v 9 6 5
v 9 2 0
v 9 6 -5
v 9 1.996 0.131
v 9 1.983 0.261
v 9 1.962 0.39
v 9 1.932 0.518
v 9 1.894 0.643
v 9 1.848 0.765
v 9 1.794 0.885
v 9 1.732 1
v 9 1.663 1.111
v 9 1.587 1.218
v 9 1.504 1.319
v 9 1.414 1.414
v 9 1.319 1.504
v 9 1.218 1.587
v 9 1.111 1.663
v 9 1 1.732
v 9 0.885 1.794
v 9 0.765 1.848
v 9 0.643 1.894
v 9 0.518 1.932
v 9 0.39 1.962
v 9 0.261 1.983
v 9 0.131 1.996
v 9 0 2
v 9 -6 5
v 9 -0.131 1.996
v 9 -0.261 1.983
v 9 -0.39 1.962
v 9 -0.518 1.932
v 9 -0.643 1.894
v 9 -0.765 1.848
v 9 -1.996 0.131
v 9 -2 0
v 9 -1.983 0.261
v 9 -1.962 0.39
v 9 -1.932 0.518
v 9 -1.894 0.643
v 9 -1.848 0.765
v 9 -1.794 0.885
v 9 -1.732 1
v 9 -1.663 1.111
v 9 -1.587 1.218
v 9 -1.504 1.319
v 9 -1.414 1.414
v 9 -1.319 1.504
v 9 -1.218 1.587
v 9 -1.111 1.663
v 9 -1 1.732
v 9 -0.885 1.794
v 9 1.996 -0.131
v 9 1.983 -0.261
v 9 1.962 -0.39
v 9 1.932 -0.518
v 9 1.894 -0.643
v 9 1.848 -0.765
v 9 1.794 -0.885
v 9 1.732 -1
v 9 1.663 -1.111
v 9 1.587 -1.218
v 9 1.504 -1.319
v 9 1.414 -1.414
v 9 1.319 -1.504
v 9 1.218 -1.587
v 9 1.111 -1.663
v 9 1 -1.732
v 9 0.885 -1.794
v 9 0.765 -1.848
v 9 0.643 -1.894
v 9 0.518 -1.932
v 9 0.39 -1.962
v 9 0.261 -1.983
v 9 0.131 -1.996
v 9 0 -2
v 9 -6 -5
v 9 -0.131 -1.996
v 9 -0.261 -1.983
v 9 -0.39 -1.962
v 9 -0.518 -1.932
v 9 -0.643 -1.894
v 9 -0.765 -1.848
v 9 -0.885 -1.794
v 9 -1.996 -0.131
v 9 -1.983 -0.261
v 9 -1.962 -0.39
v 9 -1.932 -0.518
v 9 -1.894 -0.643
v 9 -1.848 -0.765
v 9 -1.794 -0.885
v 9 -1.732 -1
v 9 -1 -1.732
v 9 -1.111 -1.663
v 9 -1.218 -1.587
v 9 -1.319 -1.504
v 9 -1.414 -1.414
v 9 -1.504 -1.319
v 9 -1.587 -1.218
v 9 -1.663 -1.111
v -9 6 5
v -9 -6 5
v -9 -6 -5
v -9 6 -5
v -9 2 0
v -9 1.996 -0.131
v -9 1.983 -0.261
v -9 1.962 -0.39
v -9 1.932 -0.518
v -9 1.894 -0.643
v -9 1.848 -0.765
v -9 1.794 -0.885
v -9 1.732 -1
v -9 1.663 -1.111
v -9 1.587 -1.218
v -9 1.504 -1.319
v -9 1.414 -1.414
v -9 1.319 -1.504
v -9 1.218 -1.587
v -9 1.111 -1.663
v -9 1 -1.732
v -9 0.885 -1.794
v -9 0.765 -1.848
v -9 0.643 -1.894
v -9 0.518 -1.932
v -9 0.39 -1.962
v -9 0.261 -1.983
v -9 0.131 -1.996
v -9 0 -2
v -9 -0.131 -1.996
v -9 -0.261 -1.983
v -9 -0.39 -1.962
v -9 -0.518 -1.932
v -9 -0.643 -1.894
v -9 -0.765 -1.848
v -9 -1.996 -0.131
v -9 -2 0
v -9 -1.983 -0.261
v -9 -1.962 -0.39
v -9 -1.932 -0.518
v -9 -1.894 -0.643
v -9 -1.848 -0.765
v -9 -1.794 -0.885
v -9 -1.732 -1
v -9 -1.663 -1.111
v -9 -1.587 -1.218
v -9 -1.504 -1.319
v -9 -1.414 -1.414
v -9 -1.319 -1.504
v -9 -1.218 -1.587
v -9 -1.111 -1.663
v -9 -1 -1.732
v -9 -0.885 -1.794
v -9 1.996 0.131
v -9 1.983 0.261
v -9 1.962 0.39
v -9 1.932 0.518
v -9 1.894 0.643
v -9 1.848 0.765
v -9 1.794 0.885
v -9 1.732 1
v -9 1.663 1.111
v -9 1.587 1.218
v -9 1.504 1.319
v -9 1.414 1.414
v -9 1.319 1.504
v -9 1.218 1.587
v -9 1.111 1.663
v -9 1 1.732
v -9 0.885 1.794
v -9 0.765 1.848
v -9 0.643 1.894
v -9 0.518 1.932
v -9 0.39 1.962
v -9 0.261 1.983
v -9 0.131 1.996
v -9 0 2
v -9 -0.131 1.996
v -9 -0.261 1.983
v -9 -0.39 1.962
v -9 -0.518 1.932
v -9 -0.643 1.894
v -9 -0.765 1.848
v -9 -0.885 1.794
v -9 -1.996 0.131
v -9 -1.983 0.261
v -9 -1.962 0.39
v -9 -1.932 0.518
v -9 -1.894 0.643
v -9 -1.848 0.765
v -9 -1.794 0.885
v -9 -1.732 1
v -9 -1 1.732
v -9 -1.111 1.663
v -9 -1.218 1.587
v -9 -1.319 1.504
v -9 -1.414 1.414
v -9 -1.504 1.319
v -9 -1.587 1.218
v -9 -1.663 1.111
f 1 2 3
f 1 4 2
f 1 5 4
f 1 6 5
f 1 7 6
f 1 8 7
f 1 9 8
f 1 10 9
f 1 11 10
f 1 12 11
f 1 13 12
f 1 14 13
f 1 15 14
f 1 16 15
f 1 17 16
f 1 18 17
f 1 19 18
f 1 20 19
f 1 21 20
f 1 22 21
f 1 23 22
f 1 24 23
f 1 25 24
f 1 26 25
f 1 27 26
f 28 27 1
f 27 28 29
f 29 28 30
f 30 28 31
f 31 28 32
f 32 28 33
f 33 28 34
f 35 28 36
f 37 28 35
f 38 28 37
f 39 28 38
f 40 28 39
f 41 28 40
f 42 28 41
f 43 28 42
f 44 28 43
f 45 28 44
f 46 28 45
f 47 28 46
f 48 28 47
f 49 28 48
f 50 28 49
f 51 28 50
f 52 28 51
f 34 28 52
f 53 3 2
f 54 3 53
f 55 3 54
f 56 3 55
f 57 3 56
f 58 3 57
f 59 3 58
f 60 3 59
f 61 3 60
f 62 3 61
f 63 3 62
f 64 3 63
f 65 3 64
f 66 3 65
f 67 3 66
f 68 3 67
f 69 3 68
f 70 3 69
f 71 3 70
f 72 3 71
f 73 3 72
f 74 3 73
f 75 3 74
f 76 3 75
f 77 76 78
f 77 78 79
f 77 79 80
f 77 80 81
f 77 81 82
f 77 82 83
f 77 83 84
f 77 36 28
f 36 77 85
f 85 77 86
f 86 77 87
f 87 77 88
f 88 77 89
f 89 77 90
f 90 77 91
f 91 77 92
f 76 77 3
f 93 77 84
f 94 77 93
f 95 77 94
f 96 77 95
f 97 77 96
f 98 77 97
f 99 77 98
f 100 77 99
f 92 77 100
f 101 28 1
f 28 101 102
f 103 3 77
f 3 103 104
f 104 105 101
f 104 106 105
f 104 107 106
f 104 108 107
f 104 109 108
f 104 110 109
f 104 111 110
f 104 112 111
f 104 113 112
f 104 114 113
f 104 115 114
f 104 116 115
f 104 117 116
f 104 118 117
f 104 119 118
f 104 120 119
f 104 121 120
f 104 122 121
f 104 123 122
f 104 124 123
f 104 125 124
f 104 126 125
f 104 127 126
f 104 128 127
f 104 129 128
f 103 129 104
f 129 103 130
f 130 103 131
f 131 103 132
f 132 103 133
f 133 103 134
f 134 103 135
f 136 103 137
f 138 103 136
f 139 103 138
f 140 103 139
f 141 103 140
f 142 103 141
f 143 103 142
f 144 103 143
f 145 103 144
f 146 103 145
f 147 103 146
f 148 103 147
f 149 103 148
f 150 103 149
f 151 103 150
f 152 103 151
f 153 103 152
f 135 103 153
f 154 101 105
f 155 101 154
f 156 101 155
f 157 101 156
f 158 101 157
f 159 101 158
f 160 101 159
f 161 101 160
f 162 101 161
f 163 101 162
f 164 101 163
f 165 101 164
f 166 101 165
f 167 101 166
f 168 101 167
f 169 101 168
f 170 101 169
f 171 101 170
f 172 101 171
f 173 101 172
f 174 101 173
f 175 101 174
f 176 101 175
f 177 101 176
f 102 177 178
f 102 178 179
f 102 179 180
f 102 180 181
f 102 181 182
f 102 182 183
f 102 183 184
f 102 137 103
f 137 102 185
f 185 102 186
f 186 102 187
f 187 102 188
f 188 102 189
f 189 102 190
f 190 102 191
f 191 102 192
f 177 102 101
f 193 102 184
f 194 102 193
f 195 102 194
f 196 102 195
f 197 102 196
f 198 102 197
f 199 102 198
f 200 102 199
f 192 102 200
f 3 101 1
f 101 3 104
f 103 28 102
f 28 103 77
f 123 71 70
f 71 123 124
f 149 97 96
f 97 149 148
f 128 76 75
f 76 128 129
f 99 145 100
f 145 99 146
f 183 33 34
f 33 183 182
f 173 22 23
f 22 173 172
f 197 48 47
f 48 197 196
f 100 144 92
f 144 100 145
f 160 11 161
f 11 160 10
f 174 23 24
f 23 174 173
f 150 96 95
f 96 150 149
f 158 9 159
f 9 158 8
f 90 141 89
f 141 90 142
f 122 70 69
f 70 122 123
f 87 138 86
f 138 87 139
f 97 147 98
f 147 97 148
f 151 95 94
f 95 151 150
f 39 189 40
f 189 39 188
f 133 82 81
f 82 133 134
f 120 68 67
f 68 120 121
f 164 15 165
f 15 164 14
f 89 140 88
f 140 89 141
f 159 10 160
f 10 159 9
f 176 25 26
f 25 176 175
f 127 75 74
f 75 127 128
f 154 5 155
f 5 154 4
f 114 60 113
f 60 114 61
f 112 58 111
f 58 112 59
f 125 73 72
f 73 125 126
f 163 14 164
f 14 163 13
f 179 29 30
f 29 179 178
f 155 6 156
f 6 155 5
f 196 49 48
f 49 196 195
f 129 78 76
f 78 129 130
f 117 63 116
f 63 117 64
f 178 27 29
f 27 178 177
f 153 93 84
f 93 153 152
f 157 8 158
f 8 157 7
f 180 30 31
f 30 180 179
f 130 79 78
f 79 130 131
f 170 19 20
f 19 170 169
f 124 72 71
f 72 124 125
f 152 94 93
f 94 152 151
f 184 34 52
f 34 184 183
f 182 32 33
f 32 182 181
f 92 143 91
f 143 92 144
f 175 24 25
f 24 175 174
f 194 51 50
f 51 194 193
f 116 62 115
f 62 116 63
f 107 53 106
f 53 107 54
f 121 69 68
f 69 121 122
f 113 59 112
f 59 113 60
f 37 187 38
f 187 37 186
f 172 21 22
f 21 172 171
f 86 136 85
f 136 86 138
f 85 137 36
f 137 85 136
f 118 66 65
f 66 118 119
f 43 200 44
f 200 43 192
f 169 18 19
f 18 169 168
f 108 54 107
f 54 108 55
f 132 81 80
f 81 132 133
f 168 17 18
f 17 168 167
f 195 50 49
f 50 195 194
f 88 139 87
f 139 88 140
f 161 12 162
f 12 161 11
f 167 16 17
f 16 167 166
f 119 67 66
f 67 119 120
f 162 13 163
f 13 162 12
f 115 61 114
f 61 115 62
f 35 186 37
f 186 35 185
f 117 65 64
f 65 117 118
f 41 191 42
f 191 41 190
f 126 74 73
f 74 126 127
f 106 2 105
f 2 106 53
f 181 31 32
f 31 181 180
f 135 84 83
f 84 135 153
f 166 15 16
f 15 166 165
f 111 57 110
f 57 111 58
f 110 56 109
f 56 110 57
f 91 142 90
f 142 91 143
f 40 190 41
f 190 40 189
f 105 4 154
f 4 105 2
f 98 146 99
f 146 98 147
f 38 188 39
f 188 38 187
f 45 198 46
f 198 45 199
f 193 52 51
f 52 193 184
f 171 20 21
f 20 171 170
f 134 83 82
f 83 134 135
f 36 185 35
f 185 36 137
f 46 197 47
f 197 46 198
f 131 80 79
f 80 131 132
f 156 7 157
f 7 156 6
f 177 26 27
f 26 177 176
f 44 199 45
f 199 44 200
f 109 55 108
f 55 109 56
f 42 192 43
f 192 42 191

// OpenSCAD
// Auto-generated from tests/data/feature_fixtures_manifest.json
// fixture: box_x_through_hole
// fixture_type: box
// description: Centered box with one through-hole along the x axis.
$fn = 96;

box_size = [18.000000, 12.000000, 10.000000];
box_origin = [-9.000000, -6.000000, -5.000000];

module through_hole_x(center, diameter, length) {
  translate([box_origin[0] - 0.1, center[1], center[2]])
    rotate(a=90, v=[0, 1, 0]) cylinder(d=diameter, h=length, center=false);
}

module through_hole_y(center, diameter, length) {
  translate([center[0], box_origin[1] - 0.1, center[2]])
    rotate(a=90, v=[-1, 0, 0]) cylinder(d=diameter, h=length, center=false);
}

module through_hole_z(center, diameter, length) {
  translate([center[0], center[1], box_origin[2] - 0.1])
    cylinder(d=diameter, h=length, center=false);
}

difference() {
  translate(box_origin) cube(box_size);
  through_hole_x([0.000000, 0.000000, 0.000000], 4.000000, 18.200000);  // hole_0
}
